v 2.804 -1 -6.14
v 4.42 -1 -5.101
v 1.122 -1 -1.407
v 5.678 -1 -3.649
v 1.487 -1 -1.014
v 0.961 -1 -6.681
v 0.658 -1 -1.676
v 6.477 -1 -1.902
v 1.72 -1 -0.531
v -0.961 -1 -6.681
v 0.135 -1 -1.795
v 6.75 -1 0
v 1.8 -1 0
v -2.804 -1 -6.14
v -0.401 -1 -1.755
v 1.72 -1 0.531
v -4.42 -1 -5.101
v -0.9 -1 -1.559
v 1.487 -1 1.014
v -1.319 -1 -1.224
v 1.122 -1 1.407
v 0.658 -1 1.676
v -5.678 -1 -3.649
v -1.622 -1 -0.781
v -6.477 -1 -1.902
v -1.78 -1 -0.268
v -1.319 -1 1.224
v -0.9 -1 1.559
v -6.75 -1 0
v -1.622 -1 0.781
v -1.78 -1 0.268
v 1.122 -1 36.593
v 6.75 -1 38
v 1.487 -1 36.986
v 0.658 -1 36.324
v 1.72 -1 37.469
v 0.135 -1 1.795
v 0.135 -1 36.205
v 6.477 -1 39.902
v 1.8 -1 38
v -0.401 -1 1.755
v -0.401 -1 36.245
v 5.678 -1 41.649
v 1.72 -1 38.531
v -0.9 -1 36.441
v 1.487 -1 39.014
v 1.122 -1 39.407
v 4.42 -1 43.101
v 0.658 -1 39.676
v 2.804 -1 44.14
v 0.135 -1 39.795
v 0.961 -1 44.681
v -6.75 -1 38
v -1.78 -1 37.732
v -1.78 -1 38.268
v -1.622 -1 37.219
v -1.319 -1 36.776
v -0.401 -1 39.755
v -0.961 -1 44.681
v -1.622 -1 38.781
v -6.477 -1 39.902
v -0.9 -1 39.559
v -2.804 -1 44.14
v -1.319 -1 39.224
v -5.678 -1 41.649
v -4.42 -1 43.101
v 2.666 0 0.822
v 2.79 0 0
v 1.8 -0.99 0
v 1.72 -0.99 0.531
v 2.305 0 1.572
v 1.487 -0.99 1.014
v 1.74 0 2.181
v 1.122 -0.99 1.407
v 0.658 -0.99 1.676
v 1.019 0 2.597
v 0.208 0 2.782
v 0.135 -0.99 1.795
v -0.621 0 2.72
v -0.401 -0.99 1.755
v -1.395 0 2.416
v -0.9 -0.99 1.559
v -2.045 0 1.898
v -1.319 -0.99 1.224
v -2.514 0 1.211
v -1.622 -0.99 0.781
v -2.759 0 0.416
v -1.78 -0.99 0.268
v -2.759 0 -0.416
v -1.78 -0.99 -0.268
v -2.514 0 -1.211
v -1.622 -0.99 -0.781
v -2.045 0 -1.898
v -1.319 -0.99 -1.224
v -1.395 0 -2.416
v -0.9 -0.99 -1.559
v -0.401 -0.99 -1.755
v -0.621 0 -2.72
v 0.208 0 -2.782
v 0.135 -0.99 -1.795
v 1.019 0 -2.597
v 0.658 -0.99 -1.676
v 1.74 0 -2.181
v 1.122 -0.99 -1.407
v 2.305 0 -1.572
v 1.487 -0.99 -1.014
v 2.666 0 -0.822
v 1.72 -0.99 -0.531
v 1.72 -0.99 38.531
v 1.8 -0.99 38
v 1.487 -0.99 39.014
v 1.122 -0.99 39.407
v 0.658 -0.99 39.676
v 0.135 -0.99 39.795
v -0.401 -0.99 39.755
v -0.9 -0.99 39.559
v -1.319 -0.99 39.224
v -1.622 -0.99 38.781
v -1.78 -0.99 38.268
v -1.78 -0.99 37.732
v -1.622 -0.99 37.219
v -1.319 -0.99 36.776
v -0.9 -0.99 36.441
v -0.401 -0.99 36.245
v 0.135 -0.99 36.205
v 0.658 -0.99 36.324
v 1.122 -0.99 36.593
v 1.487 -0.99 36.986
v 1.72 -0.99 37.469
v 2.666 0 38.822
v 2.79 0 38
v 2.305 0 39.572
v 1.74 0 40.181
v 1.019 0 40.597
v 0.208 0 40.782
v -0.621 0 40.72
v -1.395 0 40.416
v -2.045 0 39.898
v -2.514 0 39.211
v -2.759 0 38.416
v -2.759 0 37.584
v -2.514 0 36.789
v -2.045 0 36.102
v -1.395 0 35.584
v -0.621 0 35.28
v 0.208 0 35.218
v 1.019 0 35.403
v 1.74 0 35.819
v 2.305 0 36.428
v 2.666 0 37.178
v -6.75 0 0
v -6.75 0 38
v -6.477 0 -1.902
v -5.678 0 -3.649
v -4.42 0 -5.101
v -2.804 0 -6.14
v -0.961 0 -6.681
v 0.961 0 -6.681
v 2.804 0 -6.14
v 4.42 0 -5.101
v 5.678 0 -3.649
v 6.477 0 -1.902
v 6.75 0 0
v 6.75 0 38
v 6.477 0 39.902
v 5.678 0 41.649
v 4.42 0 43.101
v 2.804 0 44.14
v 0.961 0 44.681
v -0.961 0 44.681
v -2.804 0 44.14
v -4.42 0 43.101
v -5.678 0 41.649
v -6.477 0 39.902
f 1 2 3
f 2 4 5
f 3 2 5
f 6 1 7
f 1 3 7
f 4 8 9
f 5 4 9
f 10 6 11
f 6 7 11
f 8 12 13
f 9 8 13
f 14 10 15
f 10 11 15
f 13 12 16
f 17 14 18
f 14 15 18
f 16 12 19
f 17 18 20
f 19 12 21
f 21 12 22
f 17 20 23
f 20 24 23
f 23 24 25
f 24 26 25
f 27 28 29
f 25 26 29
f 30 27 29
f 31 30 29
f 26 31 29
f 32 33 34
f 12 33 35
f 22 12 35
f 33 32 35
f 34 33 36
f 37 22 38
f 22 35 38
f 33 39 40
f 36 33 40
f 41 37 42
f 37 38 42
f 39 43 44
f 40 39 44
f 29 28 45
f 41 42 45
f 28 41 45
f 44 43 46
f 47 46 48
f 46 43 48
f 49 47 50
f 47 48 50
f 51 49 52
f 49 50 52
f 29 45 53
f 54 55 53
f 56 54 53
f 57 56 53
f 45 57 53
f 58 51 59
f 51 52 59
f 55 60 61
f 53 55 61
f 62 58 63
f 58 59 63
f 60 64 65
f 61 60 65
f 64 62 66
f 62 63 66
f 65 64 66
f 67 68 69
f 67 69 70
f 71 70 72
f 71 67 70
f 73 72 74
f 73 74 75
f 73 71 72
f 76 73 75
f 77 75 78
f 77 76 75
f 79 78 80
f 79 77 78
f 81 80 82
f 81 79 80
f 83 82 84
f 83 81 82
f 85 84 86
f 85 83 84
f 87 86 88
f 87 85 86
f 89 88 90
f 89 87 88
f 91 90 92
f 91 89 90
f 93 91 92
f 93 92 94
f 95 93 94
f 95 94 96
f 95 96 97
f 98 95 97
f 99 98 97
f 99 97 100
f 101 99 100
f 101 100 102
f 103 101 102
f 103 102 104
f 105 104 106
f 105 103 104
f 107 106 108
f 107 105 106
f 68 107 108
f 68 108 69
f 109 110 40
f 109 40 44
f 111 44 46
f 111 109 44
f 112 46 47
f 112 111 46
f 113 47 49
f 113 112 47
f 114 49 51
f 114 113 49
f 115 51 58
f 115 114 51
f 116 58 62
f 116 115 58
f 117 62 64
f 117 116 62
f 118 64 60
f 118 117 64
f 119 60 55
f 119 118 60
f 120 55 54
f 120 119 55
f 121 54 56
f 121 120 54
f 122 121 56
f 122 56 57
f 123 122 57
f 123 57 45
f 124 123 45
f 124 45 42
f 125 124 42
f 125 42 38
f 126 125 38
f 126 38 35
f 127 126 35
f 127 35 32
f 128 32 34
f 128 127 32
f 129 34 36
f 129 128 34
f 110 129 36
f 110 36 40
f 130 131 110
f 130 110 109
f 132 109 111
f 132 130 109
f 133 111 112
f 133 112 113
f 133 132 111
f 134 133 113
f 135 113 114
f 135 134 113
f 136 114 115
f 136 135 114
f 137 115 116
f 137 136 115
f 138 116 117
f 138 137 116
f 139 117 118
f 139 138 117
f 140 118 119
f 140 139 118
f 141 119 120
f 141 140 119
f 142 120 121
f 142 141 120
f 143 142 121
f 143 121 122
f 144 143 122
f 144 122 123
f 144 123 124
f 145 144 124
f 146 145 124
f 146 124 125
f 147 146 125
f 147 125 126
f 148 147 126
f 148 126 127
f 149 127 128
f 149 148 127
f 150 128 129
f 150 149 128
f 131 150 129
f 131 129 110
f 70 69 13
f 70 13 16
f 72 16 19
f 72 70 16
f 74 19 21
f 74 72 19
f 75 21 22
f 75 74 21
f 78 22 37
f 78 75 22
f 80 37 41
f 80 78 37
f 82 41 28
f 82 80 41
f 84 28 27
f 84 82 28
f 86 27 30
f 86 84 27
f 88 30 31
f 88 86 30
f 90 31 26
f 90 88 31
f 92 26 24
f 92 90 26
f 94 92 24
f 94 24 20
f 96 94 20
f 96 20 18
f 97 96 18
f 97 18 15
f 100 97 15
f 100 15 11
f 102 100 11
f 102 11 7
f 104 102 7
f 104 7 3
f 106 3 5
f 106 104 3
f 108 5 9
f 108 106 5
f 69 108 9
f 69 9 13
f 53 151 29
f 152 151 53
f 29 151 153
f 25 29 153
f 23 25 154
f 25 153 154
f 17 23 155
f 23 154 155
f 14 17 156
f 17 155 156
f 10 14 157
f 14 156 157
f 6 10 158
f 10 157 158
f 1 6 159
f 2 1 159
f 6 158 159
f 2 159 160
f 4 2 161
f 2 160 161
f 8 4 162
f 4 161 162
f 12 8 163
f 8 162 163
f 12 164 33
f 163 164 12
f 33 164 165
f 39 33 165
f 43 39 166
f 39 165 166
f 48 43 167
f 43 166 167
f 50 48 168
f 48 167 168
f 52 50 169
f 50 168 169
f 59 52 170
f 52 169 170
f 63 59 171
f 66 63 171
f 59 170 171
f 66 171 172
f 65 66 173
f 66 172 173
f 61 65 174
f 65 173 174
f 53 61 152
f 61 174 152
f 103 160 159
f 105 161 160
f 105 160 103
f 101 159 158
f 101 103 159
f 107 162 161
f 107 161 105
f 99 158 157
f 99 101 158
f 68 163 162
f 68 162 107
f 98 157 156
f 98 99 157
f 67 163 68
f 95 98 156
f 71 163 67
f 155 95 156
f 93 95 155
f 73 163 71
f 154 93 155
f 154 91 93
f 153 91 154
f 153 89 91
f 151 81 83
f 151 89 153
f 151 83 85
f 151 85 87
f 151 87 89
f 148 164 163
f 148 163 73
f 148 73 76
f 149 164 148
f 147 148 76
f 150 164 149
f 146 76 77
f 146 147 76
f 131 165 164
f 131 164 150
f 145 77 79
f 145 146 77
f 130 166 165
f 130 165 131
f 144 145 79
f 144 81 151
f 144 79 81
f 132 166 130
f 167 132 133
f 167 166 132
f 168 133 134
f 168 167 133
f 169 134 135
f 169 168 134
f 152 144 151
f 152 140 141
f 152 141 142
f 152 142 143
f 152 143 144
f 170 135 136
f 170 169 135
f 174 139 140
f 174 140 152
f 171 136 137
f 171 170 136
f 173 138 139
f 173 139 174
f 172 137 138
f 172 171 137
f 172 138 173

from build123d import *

# Parameters (mm, degrees)
SKETCH_R     = 1.8
PAD_DEPTH    = 1
CHAMFER_SIZE = 0.99


with BuildPart() as part:
    # Sketch → Pad (new body)
    with BuildSketch(Plane.XZ):
        with BuildLine():
            Line((6.75, 38), (6.75, 0))
            ThreePointArc((-6.75, 0), (0, -6.75), (6.75, 0))
            Line((-6.75, 0), (-6.75, 38))
            ThreePointArc((6.75, 38), (0, 44.75), (-6.75, 38))
        make_face()
        with Locations((0, 38)):
            Circle(SKETCH_R, mode=Mode.SUBTRACT)
        Circle(SKETCH_R, mode=Mode.SUBTRACT)
    extrude(amount=PAD_DEPTH)

    # Chamfer
    chamfer_edges = [part.edges().sort_by_distance(p)[0] for p in [
        (-1.8, 0, 0),
        (-1.8, 0, 38),
    ]]
    chamfer(chamfer_edges, length=CHAMFER_SIZE)


solid = part.part
